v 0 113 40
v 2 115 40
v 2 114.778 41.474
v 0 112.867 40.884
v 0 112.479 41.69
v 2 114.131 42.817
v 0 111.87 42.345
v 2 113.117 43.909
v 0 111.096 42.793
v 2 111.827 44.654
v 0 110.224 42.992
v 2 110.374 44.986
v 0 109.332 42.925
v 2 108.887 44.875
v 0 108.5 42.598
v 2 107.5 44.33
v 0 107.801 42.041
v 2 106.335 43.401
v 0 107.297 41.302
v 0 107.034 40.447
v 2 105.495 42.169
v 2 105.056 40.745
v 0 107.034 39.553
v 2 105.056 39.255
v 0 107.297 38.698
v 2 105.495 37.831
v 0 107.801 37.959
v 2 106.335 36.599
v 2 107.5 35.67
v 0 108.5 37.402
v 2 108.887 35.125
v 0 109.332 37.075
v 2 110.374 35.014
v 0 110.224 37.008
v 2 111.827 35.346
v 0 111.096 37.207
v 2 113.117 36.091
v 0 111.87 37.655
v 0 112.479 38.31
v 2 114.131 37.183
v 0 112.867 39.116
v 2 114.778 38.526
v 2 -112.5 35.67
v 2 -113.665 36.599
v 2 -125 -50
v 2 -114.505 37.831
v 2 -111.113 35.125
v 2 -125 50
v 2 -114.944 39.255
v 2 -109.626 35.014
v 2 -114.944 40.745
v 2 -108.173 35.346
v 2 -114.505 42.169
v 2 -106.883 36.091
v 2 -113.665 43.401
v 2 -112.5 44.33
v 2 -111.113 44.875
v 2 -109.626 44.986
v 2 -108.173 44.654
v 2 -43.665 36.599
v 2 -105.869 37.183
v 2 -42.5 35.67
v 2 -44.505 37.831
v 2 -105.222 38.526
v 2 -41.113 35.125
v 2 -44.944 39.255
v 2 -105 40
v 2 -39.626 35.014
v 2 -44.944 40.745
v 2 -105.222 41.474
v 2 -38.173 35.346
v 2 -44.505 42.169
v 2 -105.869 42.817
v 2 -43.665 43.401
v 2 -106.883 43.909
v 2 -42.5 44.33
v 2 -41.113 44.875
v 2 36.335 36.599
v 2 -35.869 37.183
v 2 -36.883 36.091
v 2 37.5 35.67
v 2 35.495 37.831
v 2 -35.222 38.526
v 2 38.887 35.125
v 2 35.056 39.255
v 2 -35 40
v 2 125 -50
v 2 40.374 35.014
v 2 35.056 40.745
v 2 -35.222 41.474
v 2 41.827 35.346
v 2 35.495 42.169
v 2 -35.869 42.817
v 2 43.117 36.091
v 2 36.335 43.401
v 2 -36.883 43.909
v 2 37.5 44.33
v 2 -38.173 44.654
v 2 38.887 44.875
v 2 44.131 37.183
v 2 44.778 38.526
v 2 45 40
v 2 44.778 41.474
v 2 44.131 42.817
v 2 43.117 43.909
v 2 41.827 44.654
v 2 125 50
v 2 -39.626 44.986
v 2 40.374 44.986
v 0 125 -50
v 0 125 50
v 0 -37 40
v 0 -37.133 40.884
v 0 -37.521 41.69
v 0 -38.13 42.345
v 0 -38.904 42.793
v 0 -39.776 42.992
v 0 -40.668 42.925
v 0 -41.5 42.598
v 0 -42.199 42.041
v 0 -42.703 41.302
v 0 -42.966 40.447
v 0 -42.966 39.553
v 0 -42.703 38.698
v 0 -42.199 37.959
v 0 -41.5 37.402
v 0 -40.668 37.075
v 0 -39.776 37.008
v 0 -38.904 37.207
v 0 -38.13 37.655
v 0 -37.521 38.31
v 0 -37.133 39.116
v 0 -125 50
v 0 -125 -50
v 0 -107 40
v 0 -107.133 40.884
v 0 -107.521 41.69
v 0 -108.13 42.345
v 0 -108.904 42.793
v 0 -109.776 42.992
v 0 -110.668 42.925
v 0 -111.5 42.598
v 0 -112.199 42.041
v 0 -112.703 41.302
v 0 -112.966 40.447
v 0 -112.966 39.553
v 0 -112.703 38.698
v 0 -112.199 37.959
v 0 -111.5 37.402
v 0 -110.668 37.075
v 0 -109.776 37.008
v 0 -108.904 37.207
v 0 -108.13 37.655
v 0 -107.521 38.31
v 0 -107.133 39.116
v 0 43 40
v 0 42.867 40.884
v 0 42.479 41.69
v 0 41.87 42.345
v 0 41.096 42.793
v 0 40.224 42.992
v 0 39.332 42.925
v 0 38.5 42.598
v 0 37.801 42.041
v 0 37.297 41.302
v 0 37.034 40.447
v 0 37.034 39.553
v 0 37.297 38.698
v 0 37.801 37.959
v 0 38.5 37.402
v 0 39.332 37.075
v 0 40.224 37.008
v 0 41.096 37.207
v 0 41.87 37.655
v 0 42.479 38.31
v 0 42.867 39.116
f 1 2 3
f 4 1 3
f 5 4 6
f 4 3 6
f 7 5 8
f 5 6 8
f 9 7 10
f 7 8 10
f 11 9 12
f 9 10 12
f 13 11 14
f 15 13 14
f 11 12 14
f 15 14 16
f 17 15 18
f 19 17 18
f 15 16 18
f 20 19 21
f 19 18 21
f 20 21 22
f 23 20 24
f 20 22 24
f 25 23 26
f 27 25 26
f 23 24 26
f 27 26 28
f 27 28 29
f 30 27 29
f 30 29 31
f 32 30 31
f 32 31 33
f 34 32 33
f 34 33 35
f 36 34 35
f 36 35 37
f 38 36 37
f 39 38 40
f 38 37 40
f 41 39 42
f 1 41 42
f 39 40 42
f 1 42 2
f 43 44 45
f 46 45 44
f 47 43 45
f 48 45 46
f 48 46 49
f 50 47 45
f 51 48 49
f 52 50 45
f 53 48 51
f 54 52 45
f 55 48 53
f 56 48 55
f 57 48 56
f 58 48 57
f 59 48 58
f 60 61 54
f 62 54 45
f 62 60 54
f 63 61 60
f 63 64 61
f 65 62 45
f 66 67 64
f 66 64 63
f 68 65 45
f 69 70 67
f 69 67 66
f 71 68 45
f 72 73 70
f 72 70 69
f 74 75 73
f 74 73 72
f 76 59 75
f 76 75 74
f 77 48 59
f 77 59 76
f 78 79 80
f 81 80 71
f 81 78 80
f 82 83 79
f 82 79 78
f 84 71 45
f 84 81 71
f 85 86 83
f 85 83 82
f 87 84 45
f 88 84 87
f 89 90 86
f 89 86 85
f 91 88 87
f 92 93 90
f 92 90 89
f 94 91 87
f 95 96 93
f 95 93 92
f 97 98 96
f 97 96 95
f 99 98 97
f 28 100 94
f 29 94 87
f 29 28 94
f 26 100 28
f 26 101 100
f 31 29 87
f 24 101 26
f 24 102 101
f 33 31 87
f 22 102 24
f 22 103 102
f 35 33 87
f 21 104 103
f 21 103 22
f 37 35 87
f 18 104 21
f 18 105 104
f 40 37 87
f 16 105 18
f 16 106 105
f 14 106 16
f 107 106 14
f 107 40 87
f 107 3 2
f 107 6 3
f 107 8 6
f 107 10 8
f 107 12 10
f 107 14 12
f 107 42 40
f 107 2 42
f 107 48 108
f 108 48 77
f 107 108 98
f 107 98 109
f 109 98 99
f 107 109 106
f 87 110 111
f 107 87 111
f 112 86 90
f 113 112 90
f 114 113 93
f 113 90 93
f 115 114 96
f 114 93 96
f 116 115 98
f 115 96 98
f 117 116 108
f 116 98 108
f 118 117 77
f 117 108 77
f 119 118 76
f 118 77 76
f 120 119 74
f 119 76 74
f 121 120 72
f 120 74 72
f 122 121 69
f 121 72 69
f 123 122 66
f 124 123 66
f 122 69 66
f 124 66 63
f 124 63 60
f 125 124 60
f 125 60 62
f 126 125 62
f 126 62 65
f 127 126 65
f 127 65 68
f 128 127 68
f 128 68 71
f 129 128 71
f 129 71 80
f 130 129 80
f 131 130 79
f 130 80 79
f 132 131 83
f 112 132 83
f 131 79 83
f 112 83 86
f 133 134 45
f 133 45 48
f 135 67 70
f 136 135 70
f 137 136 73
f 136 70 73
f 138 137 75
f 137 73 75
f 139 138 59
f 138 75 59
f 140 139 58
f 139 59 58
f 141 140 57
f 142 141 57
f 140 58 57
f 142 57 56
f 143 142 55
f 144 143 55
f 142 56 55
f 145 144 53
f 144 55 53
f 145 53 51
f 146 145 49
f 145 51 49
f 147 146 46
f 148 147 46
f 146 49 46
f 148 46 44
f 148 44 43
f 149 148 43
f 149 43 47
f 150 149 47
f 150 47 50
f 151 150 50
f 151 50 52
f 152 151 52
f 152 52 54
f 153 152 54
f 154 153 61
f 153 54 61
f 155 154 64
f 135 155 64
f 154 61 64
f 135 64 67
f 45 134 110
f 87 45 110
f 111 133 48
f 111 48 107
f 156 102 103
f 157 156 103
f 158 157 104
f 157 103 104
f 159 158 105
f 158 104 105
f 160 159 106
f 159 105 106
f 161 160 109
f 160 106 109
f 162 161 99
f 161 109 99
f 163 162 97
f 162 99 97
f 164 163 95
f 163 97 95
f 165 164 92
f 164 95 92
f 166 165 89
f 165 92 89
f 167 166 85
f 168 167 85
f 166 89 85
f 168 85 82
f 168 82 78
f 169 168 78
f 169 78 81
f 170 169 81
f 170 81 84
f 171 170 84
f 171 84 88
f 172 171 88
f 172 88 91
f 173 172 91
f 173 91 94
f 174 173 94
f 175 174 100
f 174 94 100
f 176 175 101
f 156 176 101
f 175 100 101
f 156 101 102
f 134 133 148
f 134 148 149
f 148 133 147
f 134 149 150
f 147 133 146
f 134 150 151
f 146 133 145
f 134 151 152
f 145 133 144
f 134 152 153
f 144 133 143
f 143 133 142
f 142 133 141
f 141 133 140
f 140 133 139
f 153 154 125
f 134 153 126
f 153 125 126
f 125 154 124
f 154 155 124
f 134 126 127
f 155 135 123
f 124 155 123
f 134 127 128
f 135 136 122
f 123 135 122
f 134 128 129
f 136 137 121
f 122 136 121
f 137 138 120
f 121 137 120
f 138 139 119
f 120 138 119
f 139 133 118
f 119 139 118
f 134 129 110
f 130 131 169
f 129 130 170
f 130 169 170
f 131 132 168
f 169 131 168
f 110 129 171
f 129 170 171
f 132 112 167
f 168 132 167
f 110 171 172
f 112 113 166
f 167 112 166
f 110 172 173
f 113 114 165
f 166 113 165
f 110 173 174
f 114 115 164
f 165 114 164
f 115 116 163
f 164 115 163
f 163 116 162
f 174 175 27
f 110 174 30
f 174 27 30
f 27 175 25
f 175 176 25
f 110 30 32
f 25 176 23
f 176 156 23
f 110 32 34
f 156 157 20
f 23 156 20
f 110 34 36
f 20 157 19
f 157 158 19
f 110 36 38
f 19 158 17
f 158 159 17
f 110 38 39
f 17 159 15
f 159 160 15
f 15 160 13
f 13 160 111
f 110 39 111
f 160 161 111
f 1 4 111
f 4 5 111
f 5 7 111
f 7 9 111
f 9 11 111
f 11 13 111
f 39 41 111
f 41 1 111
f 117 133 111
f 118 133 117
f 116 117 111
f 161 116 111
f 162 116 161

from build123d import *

# Parameters (mm, degrees)
F0_W     = 250
F0_H     = 100
F0_R     = 3
F1_DEPTH = 2
F2_SIZE  = 1.99999


# Not quite as in the source:
# - a fillet or chamfer is up to 0.001 mm smaller than in the source, because OpenCascade refuses the exact size


with BuildPart() as f1:
    # F0 (on Right) → F1 (new body)
    with BuildSketch(Plane.YZ):
        Rectangle(F0_W, F0_H)
        with Locations((-110, 40)):
            Circle(F0_R, mode=Mode.SUBTRACT)
        with Locations((-40, 40)):
            Circle(F0_R, mode=Mode.SUBTRACT)
        with Locations((40, 40)):
            Circle(F0_R, mode=Mode.SUBTRACT)
        with Locations((110, 40)):
            Circle(F0_R, mode=Mode.SUBTRACT)
    extrude(amount=F1_DEPTH)

    # F2 (size 2 in the source; OpenCascade refuses exactly that, so slightly less here)
    f2_edges = [f1.edges().sort_by_distance(p)[0] for p in [
        (2, -113, 40),
        (2, -43, 40),
        (2, 37, 40),
        (2, 107, 40),
    ]]
    chamfer(f2_edges, length=F2_SIZE)


solid = f1.part
